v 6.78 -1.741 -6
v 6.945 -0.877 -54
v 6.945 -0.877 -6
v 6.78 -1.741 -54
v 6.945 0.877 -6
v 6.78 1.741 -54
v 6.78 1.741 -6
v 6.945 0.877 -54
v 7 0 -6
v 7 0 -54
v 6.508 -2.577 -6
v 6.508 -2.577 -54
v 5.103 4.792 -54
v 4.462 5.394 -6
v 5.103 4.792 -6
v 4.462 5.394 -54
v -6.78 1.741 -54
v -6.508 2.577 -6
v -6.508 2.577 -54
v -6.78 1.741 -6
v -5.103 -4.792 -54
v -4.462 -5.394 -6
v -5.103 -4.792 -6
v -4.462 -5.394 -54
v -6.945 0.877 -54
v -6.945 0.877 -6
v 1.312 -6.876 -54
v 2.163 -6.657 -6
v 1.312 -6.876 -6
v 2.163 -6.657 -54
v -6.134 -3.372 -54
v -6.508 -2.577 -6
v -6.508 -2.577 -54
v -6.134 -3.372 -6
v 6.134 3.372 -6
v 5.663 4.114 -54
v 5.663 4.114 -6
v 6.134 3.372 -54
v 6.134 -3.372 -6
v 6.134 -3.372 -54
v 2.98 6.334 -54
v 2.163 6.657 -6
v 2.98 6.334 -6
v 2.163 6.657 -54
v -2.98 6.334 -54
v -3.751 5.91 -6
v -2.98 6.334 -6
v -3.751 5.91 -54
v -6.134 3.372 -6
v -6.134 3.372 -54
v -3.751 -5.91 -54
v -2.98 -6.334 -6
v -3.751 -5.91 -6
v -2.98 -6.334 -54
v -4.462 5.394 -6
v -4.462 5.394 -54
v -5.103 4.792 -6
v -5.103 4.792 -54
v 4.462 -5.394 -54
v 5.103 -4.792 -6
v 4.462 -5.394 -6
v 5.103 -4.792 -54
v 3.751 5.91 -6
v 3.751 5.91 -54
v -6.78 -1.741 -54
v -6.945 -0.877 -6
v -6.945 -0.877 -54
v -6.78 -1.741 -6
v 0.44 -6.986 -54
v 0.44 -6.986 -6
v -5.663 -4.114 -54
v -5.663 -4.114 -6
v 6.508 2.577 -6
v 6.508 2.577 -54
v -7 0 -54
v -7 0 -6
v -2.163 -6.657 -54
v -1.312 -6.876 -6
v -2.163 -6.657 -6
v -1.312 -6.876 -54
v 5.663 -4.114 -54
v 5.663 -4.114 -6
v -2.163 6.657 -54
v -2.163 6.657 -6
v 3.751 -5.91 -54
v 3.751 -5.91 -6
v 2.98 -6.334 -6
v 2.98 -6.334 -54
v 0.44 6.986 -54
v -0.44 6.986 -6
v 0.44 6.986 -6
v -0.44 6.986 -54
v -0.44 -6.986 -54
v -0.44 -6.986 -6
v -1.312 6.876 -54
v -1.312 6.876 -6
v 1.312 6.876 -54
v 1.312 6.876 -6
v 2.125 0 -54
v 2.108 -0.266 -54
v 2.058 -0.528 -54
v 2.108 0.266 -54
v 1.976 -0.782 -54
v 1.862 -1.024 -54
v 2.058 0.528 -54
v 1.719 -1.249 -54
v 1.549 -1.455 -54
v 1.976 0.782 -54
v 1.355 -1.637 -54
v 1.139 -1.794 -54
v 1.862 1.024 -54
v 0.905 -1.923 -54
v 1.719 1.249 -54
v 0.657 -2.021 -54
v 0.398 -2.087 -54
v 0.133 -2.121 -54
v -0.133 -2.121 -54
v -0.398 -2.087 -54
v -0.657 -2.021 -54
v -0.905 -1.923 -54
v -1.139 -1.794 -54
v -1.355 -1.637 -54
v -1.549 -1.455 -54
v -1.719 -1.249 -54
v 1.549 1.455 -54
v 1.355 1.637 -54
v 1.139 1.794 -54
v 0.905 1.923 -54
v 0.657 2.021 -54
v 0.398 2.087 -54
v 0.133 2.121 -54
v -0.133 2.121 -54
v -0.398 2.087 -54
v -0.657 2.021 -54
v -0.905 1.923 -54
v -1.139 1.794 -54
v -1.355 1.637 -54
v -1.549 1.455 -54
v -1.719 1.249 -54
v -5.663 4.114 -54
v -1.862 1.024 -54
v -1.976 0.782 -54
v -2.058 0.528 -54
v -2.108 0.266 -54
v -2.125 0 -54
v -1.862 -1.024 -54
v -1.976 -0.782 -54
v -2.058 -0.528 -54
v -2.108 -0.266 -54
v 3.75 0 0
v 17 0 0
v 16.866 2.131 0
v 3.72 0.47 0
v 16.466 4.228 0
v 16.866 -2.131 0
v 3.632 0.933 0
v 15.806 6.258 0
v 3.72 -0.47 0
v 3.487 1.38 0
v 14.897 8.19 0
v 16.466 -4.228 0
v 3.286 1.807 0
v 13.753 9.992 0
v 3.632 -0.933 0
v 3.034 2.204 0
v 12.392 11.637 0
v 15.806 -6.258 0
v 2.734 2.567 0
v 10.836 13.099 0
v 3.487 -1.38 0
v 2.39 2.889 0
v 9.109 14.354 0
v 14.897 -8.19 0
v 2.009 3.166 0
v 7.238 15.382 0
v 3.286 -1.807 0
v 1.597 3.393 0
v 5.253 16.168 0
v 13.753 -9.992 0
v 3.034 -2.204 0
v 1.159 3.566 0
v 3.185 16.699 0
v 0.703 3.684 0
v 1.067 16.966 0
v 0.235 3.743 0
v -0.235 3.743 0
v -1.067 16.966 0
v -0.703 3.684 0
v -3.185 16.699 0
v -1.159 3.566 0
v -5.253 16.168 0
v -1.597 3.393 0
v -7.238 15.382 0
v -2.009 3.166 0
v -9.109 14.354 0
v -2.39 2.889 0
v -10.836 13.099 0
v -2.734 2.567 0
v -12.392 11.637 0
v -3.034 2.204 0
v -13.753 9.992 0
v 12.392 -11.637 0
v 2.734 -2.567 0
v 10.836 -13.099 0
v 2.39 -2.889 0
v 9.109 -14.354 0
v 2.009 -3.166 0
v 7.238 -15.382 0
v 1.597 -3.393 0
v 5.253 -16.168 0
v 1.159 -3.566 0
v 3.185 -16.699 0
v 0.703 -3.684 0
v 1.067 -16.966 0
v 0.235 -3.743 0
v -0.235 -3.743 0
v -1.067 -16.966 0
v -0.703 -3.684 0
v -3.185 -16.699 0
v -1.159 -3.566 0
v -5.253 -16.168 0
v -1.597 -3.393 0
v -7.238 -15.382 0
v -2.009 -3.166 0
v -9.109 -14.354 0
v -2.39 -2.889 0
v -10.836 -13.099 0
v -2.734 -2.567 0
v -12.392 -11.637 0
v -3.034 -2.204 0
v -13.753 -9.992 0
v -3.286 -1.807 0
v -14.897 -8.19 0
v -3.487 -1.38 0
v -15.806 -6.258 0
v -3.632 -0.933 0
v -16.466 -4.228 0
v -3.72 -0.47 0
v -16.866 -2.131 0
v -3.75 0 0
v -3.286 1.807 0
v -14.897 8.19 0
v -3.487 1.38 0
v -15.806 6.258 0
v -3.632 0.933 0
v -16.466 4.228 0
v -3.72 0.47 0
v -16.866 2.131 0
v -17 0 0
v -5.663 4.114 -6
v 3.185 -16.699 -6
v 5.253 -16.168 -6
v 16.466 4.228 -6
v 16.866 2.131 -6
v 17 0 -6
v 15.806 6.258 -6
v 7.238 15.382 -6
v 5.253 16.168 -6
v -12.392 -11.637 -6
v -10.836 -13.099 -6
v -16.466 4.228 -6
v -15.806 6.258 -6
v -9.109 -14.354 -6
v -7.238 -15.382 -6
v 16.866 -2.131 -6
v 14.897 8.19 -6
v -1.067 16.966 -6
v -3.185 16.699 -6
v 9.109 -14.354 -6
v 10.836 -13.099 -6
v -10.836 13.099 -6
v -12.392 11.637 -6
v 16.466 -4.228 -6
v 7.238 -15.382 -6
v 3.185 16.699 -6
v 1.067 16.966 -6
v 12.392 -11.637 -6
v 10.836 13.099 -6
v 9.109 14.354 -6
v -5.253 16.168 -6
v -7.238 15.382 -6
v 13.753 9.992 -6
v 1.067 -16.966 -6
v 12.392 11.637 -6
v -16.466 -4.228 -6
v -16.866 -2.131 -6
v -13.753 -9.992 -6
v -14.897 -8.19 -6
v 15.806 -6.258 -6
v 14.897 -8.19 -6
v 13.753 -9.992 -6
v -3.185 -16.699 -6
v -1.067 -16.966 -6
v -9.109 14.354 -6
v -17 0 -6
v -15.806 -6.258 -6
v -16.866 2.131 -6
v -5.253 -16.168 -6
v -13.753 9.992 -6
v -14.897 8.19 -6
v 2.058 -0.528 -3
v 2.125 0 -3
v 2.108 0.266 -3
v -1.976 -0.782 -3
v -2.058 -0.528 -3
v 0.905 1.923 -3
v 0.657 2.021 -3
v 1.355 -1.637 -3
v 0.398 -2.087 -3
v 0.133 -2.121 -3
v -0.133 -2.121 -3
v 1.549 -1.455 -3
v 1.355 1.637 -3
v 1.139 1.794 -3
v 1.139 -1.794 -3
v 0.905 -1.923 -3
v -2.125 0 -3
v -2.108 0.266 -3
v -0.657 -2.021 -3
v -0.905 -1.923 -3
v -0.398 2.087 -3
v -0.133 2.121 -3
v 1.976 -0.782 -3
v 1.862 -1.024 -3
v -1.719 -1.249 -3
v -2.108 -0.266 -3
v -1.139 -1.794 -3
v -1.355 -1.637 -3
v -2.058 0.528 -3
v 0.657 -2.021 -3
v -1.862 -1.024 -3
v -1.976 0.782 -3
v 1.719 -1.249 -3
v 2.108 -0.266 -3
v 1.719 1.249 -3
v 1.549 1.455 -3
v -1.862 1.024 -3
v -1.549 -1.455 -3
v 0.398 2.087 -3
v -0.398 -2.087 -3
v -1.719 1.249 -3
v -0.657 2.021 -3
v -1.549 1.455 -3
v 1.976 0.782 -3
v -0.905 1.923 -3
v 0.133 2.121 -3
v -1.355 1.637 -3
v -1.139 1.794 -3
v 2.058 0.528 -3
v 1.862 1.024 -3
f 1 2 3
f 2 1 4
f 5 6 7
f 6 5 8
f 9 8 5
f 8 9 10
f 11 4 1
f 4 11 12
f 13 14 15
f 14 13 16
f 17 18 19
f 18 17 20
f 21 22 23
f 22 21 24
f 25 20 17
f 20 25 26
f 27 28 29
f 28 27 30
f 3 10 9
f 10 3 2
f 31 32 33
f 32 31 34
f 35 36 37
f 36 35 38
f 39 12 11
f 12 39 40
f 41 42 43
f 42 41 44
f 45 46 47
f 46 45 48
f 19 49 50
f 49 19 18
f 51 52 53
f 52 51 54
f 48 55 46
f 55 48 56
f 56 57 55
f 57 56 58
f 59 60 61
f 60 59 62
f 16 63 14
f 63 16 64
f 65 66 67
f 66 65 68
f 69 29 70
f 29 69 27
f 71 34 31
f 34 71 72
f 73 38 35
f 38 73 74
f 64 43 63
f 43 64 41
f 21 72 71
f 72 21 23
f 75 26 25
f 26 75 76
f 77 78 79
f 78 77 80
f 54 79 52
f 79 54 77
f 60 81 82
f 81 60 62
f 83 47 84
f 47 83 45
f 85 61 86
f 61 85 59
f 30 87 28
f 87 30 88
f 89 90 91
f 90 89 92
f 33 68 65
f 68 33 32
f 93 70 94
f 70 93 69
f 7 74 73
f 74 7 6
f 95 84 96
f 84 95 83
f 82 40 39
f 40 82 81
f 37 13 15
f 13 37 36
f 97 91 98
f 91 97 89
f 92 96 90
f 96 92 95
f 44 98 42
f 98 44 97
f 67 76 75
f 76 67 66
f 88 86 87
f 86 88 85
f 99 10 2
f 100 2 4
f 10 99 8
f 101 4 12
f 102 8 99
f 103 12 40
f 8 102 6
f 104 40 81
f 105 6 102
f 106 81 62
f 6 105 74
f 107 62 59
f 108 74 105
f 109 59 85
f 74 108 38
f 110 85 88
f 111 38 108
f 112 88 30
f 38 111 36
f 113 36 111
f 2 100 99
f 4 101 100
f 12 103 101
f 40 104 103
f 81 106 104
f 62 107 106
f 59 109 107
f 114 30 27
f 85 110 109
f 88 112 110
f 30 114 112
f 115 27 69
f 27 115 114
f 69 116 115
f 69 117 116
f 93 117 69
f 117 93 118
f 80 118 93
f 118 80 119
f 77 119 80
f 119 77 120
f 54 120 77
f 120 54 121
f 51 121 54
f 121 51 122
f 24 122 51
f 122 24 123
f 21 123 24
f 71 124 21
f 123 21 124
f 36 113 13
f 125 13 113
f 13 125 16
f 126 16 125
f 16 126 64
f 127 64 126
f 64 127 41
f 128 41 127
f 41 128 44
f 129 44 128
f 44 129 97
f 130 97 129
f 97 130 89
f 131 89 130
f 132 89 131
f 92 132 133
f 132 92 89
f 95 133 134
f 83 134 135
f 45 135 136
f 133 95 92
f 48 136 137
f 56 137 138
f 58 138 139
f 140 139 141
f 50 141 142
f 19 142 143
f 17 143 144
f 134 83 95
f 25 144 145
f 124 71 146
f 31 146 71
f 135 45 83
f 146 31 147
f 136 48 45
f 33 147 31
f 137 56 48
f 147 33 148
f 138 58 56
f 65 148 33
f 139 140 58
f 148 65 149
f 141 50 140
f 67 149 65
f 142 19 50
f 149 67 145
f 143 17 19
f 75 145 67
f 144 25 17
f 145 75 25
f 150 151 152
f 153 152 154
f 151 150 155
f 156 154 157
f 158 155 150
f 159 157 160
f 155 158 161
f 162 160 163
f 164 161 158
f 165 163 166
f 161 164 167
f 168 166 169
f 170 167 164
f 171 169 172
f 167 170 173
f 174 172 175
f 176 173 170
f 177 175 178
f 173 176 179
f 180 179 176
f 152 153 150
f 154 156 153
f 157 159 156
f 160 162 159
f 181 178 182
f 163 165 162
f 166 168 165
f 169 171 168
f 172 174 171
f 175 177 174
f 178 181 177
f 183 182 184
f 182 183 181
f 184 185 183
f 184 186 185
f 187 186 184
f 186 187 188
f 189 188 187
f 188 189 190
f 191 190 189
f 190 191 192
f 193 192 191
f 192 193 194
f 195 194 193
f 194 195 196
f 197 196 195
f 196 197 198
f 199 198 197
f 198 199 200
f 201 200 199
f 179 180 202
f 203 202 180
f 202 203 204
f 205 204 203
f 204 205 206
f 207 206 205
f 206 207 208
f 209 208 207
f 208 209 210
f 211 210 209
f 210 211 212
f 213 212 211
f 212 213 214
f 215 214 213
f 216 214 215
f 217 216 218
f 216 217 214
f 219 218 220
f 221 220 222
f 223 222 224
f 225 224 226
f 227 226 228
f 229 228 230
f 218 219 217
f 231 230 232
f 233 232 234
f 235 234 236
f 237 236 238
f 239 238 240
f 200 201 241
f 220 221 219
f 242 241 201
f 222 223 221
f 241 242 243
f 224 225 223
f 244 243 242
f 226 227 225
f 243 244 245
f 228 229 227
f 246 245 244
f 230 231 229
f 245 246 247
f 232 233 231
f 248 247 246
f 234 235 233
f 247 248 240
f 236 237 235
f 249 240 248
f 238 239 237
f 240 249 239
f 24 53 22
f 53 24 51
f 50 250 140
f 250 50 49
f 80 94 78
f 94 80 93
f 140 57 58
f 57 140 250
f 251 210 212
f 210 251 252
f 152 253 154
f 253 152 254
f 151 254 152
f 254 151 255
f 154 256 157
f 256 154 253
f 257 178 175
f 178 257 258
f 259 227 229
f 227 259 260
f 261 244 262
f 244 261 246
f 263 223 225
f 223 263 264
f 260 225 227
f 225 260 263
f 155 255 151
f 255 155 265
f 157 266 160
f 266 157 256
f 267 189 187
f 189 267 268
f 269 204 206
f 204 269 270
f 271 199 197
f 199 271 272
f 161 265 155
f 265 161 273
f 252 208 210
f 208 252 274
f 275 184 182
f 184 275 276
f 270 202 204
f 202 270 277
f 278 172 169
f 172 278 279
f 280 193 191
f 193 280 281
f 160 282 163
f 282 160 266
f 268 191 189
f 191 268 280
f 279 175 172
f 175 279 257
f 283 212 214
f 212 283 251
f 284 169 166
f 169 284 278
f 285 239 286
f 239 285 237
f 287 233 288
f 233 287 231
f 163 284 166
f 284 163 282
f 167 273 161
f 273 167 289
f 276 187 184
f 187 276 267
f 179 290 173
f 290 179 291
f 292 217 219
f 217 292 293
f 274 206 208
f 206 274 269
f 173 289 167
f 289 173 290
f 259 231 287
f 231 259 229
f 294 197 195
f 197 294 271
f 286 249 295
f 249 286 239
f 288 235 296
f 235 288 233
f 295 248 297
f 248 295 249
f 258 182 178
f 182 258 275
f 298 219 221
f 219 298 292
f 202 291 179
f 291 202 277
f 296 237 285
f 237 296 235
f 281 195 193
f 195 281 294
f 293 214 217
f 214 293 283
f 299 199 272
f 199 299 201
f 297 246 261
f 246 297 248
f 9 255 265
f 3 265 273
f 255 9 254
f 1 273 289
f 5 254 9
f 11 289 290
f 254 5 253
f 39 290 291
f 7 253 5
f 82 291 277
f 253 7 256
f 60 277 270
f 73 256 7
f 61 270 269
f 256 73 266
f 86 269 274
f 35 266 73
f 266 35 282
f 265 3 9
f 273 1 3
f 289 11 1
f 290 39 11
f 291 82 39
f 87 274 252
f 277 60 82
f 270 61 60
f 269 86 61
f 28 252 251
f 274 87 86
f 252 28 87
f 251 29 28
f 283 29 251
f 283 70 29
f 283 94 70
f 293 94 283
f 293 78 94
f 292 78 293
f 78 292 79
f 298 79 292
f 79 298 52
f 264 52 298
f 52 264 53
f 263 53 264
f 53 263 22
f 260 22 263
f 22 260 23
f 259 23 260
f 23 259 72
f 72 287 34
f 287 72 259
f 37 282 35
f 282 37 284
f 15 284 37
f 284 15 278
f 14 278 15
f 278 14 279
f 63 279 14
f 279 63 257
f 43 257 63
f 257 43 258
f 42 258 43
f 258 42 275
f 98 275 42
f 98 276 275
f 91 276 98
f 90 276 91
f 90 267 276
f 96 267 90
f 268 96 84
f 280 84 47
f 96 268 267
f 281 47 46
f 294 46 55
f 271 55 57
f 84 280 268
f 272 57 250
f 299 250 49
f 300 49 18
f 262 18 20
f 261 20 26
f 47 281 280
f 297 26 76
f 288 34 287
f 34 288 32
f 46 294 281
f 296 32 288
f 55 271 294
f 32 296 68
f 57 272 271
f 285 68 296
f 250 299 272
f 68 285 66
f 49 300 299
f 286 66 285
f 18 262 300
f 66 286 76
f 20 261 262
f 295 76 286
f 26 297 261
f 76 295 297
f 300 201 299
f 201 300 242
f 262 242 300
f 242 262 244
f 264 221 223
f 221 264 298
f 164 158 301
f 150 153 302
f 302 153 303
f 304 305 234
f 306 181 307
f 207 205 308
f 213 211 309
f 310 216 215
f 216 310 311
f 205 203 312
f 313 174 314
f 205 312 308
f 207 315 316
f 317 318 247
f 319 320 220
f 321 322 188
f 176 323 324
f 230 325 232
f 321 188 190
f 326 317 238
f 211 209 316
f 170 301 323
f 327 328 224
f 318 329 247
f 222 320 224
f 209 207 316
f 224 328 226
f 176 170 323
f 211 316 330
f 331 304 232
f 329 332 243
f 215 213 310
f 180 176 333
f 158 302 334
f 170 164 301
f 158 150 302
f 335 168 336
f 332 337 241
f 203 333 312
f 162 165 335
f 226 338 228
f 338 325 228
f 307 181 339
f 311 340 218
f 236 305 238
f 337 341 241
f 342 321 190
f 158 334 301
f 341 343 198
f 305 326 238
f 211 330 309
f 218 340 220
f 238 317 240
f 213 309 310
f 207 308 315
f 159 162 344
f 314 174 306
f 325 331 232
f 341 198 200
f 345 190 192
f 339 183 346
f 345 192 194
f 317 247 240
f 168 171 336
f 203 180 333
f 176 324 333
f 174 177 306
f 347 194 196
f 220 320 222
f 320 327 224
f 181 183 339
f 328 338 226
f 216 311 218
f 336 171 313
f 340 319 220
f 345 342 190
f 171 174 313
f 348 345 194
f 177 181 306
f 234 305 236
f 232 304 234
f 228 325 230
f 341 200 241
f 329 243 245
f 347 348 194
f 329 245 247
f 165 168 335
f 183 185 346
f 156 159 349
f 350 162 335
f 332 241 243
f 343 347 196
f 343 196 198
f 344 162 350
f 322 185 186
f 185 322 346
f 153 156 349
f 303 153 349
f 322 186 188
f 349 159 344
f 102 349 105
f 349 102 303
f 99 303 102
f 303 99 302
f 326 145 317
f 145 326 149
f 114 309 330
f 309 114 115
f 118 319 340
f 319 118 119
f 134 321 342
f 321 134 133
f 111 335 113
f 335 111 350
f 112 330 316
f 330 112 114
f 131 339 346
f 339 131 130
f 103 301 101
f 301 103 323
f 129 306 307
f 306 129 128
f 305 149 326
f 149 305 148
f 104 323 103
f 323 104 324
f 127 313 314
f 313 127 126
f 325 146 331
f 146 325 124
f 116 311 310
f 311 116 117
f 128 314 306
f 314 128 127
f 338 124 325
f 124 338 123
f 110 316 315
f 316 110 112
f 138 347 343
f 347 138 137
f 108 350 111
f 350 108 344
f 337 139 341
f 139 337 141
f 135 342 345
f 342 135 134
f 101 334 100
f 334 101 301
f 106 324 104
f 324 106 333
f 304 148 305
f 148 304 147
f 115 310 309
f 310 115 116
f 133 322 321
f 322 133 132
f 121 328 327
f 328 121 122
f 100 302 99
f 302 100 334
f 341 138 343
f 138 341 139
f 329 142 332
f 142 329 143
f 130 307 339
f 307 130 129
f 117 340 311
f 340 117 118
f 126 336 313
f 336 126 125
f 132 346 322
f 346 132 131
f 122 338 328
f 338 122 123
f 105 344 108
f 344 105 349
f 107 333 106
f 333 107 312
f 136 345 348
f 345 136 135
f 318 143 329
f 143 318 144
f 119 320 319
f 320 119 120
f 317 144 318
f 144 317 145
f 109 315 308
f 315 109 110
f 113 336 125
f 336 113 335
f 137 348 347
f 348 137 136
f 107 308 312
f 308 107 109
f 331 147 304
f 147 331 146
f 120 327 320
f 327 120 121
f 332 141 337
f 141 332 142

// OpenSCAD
$fn = 50;


difference() {
	union() {
		translate(v = [0, 0, -54.0000000000]) {
			cylinder(h = 54, r = 7.0000000000);
		}
		translate(v = [0, 0, -6.0000000000]) {
			cylinder(h = 6, r = 17.0000000000);
		}
	}
	union() {
		translate(v = [0, 0, 0]) {
			rotate(a = [0, 0, 0]) {
				difference() {
					union() {
						#translate(v = [0, 0, -54.0000000000]) {
							cylinder(h = 54, r = 2.0000000000);
						}
						#translate(v = [0, 0, -3]) {
							cylinder(h = 3, r = 7.0000000000, r1 = 2.1250000000, r2 = 3.7500000000);
						}
						#translate(v = [0, 0, -54.0000000000]) {
							cylinder(h = 54, r = 2.1250000000);
						}
						#translate(v = [0, 0, -54.0000000000]) {
							cylinder(h = 54, r = 2.0000000000);
						}
					}
					union();
				}
			}
		}
	}
}
